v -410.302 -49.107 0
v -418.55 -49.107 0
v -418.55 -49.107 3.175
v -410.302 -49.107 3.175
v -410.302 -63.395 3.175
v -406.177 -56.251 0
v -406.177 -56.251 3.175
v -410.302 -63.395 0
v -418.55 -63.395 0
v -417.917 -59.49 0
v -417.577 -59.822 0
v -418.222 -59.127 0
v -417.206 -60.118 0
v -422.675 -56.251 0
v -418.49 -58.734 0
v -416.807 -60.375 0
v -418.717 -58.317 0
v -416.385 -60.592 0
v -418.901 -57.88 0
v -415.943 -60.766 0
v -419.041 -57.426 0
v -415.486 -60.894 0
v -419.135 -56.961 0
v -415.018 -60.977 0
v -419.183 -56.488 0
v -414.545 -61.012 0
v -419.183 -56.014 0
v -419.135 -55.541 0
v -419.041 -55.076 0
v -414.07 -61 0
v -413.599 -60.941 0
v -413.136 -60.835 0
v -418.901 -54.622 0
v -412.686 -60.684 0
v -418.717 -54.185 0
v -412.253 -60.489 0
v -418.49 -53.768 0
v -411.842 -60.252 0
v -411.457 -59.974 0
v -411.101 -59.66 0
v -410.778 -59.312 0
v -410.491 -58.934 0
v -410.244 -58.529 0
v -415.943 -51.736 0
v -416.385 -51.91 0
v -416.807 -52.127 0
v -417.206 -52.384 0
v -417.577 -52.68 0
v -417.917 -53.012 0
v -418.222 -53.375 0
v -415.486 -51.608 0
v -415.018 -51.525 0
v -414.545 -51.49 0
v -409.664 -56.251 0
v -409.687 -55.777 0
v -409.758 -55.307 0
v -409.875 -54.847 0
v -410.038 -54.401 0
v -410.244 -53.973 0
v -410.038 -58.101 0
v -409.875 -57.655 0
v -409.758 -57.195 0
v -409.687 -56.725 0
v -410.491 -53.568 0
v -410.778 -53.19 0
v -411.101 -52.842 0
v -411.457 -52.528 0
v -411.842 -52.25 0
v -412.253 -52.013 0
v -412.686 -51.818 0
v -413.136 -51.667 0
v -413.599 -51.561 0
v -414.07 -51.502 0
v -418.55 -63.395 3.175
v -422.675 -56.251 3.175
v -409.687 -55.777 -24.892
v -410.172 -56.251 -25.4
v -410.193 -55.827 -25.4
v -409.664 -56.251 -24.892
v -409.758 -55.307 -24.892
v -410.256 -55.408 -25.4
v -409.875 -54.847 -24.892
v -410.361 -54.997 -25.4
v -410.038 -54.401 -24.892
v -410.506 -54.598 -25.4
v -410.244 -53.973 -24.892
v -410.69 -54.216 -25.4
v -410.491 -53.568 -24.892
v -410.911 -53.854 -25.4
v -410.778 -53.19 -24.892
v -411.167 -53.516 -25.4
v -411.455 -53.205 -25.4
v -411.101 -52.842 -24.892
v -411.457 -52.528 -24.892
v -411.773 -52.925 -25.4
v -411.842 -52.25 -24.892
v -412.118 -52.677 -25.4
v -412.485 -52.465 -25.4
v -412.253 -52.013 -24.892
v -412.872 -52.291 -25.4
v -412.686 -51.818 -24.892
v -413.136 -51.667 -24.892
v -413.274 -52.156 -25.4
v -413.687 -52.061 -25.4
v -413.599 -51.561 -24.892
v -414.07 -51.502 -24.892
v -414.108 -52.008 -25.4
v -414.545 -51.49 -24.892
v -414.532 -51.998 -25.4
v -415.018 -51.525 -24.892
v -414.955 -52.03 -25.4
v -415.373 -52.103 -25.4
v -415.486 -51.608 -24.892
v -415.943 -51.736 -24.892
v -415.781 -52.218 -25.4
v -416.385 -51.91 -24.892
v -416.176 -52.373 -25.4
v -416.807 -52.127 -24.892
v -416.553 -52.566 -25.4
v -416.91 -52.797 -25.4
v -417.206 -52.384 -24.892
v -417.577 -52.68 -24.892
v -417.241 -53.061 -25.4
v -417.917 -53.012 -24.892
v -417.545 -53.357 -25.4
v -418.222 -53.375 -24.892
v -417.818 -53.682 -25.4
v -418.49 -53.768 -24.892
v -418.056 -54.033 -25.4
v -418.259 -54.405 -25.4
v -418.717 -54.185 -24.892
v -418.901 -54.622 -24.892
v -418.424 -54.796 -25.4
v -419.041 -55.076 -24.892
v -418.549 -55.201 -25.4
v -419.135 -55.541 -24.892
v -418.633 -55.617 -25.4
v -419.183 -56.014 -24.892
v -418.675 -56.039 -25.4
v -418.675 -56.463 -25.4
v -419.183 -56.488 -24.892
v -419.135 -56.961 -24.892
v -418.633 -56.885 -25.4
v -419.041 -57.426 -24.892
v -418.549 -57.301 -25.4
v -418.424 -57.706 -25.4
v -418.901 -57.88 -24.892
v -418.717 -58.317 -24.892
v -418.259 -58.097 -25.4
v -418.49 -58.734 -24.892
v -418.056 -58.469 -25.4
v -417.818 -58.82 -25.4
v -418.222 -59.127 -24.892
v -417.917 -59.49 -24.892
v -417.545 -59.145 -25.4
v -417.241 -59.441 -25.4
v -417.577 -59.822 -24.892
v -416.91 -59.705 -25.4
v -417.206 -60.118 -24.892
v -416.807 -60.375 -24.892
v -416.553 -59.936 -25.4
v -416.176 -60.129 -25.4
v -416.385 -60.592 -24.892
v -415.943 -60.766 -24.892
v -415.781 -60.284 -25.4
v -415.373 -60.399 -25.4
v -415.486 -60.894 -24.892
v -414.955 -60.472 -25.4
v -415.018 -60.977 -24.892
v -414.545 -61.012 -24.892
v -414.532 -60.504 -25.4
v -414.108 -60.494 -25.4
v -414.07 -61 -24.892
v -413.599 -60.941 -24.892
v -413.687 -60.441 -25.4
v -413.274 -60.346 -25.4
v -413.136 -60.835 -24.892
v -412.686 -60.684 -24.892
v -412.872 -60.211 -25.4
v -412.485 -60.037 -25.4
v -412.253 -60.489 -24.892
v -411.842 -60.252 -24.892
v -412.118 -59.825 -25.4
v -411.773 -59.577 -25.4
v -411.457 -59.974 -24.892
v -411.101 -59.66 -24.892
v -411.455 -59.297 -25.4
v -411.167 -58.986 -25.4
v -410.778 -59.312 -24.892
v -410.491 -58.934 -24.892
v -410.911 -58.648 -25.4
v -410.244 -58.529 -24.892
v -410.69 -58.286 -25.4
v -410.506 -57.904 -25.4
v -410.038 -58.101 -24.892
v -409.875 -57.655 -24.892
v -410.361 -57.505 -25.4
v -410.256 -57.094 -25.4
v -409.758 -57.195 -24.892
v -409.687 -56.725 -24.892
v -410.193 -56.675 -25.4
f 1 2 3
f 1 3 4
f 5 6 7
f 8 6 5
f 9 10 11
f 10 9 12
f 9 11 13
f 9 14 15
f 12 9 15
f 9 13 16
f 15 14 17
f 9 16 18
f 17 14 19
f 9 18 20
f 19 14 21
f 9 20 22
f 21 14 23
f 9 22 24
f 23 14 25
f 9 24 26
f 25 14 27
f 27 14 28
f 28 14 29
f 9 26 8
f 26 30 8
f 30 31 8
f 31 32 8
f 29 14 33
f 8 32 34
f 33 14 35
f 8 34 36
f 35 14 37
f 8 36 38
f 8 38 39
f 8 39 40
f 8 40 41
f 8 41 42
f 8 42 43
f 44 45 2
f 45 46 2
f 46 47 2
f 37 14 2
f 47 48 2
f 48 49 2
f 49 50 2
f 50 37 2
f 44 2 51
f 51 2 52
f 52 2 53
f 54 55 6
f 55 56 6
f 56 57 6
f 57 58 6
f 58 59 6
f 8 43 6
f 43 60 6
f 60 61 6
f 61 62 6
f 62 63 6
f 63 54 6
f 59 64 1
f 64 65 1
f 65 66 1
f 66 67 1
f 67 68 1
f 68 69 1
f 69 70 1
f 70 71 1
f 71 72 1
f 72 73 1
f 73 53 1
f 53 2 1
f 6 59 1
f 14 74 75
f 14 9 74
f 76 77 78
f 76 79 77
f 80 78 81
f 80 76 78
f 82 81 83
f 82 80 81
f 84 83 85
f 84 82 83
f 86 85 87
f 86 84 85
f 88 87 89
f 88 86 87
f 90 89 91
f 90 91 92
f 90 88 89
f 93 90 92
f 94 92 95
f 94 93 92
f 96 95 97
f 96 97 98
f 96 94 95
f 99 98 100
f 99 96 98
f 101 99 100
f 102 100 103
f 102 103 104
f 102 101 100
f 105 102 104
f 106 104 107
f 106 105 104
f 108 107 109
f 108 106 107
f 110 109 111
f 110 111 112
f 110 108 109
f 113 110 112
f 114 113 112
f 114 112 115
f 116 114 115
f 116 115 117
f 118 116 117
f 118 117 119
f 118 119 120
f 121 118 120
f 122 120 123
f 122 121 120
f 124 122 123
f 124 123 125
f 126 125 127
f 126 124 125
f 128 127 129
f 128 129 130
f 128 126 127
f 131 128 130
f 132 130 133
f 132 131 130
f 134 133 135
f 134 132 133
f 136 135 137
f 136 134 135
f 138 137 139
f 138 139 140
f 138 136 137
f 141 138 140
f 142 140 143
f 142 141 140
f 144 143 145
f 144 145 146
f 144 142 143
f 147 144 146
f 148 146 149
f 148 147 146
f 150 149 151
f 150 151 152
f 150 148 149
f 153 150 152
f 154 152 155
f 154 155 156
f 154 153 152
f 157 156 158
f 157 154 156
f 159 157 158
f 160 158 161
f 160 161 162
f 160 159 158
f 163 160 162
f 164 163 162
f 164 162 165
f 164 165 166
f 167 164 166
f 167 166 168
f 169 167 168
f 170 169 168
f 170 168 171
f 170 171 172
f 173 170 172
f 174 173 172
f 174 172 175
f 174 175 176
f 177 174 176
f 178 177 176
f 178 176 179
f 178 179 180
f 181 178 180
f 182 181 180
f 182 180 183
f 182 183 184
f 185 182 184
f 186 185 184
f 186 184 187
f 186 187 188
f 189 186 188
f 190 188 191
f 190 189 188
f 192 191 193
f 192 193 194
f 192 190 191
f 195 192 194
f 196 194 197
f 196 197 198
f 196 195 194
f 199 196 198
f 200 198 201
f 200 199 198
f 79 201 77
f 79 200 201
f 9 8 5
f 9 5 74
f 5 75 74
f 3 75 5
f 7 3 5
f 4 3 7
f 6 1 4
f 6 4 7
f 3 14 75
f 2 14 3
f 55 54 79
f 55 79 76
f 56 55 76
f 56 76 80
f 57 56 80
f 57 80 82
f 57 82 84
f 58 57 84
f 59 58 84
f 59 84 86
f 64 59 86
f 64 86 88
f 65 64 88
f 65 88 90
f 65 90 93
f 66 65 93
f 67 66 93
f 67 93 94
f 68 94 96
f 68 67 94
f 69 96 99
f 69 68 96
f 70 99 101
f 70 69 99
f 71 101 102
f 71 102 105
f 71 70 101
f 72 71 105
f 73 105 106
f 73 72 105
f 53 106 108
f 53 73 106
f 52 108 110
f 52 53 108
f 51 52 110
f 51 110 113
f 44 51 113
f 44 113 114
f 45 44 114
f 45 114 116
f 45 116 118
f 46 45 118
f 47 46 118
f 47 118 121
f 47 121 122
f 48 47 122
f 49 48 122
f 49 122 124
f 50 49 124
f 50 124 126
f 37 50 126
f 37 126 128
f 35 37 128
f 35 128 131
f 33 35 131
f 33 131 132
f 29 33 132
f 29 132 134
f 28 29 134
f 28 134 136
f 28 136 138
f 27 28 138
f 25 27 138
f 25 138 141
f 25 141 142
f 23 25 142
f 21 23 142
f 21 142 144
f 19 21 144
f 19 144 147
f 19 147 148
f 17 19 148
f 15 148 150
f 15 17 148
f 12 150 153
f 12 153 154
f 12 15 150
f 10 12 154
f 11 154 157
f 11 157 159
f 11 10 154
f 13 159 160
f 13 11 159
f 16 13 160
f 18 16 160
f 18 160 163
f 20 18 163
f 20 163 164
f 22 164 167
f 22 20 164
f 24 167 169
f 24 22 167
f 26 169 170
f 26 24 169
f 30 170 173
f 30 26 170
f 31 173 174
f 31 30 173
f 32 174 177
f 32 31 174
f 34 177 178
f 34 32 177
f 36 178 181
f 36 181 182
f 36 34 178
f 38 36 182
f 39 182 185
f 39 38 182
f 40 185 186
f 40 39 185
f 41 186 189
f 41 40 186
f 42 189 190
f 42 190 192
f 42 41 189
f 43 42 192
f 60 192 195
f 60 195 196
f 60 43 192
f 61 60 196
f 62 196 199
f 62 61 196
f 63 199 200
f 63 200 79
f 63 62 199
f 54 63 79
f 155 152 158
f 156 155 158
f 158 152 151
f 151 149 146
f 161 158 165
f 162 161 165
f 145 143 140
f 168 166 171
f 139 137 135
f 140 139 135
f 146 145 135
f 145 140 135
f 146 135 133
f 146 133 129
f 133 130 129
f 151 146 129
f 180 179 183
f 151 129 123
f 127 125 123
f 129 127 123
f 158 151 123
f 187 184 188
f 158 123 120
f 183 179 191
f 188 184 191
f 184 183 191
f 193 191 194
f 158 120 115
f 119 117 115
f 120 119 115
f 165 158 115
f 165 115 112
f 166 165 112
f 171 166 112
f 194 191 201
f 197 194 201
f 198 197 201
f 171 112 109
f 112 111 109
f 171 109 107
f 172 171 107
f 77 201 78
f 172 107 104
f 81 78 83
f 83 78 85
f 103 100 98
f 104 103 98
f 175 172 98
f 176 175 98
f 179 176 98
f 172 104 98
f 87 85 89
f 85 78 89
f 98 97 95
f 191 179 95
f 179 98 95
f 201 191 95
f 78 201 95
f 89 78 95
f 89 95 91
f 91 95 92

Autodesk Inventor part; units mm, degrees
ref_plane "YZ Plane" through (0, 0, 0) normal (1, 0, 0) x (0, 1, 0)
ref_plane "XZ Plane" through (0, 0, 0) normal (0, 1, 0) x (-1, 0, 0)
ref_plane "XY Plane" through (0, 0, 0) normal (0, 0, 1) x (1, 0, 0)
sketch "Sketch1" plane through (0, 0, 0) normal (0, 0, 1) x (1, 0, 0)
  circle A0 centre (-414.4261, -56.251) radius 4.7625
  point P0 (0, 0)
  dimension "d0" = 9.525
extrude "Extrusion1" add sketch "Sketch1" against normal blind 25.4
sketch "Sketch2" plane through (-414.4261, -56.251, 0) normal (0, 0, 1) x (1, 0, 0)
  circle A0 centre (0, 0) radius 4.7625 projected
  line L0 (-8.2489, 0) -> (-4.1244, 7.1437)
  line L1 (-4.1244, 7.1437) -> (4.1244, 7.1438)
  line L2 (4.1244, 7.1438) -> (8.2489, 0)
  line L3 (8.2489, 0) -> (4.1244, -7.1437)
  line L4 (4.1244, -7.1437) -> (-4.1244, -7.1438)
  line L5 (-4.1244, -7.1438) -> (-8.2489, 0)
  point P0 (414.4261, 56.251)
  dimension "d3" = 14.2875
extrude "Extrusion2" add sketch "Sketch2" along normal blind 3.175 contours A0 | L0 L1 L2 L3 L4 L5
thread "Thread1" size "3/8-16 UNC" class "2A" standard "ANSI Unified Screw Threads" full length
chamfer "Chamfer1" distance 0.508 angle 45 1 edges at (-419.1886, -56.251, -25.4)
properties part number "375 bolt x4" material "Steel"
